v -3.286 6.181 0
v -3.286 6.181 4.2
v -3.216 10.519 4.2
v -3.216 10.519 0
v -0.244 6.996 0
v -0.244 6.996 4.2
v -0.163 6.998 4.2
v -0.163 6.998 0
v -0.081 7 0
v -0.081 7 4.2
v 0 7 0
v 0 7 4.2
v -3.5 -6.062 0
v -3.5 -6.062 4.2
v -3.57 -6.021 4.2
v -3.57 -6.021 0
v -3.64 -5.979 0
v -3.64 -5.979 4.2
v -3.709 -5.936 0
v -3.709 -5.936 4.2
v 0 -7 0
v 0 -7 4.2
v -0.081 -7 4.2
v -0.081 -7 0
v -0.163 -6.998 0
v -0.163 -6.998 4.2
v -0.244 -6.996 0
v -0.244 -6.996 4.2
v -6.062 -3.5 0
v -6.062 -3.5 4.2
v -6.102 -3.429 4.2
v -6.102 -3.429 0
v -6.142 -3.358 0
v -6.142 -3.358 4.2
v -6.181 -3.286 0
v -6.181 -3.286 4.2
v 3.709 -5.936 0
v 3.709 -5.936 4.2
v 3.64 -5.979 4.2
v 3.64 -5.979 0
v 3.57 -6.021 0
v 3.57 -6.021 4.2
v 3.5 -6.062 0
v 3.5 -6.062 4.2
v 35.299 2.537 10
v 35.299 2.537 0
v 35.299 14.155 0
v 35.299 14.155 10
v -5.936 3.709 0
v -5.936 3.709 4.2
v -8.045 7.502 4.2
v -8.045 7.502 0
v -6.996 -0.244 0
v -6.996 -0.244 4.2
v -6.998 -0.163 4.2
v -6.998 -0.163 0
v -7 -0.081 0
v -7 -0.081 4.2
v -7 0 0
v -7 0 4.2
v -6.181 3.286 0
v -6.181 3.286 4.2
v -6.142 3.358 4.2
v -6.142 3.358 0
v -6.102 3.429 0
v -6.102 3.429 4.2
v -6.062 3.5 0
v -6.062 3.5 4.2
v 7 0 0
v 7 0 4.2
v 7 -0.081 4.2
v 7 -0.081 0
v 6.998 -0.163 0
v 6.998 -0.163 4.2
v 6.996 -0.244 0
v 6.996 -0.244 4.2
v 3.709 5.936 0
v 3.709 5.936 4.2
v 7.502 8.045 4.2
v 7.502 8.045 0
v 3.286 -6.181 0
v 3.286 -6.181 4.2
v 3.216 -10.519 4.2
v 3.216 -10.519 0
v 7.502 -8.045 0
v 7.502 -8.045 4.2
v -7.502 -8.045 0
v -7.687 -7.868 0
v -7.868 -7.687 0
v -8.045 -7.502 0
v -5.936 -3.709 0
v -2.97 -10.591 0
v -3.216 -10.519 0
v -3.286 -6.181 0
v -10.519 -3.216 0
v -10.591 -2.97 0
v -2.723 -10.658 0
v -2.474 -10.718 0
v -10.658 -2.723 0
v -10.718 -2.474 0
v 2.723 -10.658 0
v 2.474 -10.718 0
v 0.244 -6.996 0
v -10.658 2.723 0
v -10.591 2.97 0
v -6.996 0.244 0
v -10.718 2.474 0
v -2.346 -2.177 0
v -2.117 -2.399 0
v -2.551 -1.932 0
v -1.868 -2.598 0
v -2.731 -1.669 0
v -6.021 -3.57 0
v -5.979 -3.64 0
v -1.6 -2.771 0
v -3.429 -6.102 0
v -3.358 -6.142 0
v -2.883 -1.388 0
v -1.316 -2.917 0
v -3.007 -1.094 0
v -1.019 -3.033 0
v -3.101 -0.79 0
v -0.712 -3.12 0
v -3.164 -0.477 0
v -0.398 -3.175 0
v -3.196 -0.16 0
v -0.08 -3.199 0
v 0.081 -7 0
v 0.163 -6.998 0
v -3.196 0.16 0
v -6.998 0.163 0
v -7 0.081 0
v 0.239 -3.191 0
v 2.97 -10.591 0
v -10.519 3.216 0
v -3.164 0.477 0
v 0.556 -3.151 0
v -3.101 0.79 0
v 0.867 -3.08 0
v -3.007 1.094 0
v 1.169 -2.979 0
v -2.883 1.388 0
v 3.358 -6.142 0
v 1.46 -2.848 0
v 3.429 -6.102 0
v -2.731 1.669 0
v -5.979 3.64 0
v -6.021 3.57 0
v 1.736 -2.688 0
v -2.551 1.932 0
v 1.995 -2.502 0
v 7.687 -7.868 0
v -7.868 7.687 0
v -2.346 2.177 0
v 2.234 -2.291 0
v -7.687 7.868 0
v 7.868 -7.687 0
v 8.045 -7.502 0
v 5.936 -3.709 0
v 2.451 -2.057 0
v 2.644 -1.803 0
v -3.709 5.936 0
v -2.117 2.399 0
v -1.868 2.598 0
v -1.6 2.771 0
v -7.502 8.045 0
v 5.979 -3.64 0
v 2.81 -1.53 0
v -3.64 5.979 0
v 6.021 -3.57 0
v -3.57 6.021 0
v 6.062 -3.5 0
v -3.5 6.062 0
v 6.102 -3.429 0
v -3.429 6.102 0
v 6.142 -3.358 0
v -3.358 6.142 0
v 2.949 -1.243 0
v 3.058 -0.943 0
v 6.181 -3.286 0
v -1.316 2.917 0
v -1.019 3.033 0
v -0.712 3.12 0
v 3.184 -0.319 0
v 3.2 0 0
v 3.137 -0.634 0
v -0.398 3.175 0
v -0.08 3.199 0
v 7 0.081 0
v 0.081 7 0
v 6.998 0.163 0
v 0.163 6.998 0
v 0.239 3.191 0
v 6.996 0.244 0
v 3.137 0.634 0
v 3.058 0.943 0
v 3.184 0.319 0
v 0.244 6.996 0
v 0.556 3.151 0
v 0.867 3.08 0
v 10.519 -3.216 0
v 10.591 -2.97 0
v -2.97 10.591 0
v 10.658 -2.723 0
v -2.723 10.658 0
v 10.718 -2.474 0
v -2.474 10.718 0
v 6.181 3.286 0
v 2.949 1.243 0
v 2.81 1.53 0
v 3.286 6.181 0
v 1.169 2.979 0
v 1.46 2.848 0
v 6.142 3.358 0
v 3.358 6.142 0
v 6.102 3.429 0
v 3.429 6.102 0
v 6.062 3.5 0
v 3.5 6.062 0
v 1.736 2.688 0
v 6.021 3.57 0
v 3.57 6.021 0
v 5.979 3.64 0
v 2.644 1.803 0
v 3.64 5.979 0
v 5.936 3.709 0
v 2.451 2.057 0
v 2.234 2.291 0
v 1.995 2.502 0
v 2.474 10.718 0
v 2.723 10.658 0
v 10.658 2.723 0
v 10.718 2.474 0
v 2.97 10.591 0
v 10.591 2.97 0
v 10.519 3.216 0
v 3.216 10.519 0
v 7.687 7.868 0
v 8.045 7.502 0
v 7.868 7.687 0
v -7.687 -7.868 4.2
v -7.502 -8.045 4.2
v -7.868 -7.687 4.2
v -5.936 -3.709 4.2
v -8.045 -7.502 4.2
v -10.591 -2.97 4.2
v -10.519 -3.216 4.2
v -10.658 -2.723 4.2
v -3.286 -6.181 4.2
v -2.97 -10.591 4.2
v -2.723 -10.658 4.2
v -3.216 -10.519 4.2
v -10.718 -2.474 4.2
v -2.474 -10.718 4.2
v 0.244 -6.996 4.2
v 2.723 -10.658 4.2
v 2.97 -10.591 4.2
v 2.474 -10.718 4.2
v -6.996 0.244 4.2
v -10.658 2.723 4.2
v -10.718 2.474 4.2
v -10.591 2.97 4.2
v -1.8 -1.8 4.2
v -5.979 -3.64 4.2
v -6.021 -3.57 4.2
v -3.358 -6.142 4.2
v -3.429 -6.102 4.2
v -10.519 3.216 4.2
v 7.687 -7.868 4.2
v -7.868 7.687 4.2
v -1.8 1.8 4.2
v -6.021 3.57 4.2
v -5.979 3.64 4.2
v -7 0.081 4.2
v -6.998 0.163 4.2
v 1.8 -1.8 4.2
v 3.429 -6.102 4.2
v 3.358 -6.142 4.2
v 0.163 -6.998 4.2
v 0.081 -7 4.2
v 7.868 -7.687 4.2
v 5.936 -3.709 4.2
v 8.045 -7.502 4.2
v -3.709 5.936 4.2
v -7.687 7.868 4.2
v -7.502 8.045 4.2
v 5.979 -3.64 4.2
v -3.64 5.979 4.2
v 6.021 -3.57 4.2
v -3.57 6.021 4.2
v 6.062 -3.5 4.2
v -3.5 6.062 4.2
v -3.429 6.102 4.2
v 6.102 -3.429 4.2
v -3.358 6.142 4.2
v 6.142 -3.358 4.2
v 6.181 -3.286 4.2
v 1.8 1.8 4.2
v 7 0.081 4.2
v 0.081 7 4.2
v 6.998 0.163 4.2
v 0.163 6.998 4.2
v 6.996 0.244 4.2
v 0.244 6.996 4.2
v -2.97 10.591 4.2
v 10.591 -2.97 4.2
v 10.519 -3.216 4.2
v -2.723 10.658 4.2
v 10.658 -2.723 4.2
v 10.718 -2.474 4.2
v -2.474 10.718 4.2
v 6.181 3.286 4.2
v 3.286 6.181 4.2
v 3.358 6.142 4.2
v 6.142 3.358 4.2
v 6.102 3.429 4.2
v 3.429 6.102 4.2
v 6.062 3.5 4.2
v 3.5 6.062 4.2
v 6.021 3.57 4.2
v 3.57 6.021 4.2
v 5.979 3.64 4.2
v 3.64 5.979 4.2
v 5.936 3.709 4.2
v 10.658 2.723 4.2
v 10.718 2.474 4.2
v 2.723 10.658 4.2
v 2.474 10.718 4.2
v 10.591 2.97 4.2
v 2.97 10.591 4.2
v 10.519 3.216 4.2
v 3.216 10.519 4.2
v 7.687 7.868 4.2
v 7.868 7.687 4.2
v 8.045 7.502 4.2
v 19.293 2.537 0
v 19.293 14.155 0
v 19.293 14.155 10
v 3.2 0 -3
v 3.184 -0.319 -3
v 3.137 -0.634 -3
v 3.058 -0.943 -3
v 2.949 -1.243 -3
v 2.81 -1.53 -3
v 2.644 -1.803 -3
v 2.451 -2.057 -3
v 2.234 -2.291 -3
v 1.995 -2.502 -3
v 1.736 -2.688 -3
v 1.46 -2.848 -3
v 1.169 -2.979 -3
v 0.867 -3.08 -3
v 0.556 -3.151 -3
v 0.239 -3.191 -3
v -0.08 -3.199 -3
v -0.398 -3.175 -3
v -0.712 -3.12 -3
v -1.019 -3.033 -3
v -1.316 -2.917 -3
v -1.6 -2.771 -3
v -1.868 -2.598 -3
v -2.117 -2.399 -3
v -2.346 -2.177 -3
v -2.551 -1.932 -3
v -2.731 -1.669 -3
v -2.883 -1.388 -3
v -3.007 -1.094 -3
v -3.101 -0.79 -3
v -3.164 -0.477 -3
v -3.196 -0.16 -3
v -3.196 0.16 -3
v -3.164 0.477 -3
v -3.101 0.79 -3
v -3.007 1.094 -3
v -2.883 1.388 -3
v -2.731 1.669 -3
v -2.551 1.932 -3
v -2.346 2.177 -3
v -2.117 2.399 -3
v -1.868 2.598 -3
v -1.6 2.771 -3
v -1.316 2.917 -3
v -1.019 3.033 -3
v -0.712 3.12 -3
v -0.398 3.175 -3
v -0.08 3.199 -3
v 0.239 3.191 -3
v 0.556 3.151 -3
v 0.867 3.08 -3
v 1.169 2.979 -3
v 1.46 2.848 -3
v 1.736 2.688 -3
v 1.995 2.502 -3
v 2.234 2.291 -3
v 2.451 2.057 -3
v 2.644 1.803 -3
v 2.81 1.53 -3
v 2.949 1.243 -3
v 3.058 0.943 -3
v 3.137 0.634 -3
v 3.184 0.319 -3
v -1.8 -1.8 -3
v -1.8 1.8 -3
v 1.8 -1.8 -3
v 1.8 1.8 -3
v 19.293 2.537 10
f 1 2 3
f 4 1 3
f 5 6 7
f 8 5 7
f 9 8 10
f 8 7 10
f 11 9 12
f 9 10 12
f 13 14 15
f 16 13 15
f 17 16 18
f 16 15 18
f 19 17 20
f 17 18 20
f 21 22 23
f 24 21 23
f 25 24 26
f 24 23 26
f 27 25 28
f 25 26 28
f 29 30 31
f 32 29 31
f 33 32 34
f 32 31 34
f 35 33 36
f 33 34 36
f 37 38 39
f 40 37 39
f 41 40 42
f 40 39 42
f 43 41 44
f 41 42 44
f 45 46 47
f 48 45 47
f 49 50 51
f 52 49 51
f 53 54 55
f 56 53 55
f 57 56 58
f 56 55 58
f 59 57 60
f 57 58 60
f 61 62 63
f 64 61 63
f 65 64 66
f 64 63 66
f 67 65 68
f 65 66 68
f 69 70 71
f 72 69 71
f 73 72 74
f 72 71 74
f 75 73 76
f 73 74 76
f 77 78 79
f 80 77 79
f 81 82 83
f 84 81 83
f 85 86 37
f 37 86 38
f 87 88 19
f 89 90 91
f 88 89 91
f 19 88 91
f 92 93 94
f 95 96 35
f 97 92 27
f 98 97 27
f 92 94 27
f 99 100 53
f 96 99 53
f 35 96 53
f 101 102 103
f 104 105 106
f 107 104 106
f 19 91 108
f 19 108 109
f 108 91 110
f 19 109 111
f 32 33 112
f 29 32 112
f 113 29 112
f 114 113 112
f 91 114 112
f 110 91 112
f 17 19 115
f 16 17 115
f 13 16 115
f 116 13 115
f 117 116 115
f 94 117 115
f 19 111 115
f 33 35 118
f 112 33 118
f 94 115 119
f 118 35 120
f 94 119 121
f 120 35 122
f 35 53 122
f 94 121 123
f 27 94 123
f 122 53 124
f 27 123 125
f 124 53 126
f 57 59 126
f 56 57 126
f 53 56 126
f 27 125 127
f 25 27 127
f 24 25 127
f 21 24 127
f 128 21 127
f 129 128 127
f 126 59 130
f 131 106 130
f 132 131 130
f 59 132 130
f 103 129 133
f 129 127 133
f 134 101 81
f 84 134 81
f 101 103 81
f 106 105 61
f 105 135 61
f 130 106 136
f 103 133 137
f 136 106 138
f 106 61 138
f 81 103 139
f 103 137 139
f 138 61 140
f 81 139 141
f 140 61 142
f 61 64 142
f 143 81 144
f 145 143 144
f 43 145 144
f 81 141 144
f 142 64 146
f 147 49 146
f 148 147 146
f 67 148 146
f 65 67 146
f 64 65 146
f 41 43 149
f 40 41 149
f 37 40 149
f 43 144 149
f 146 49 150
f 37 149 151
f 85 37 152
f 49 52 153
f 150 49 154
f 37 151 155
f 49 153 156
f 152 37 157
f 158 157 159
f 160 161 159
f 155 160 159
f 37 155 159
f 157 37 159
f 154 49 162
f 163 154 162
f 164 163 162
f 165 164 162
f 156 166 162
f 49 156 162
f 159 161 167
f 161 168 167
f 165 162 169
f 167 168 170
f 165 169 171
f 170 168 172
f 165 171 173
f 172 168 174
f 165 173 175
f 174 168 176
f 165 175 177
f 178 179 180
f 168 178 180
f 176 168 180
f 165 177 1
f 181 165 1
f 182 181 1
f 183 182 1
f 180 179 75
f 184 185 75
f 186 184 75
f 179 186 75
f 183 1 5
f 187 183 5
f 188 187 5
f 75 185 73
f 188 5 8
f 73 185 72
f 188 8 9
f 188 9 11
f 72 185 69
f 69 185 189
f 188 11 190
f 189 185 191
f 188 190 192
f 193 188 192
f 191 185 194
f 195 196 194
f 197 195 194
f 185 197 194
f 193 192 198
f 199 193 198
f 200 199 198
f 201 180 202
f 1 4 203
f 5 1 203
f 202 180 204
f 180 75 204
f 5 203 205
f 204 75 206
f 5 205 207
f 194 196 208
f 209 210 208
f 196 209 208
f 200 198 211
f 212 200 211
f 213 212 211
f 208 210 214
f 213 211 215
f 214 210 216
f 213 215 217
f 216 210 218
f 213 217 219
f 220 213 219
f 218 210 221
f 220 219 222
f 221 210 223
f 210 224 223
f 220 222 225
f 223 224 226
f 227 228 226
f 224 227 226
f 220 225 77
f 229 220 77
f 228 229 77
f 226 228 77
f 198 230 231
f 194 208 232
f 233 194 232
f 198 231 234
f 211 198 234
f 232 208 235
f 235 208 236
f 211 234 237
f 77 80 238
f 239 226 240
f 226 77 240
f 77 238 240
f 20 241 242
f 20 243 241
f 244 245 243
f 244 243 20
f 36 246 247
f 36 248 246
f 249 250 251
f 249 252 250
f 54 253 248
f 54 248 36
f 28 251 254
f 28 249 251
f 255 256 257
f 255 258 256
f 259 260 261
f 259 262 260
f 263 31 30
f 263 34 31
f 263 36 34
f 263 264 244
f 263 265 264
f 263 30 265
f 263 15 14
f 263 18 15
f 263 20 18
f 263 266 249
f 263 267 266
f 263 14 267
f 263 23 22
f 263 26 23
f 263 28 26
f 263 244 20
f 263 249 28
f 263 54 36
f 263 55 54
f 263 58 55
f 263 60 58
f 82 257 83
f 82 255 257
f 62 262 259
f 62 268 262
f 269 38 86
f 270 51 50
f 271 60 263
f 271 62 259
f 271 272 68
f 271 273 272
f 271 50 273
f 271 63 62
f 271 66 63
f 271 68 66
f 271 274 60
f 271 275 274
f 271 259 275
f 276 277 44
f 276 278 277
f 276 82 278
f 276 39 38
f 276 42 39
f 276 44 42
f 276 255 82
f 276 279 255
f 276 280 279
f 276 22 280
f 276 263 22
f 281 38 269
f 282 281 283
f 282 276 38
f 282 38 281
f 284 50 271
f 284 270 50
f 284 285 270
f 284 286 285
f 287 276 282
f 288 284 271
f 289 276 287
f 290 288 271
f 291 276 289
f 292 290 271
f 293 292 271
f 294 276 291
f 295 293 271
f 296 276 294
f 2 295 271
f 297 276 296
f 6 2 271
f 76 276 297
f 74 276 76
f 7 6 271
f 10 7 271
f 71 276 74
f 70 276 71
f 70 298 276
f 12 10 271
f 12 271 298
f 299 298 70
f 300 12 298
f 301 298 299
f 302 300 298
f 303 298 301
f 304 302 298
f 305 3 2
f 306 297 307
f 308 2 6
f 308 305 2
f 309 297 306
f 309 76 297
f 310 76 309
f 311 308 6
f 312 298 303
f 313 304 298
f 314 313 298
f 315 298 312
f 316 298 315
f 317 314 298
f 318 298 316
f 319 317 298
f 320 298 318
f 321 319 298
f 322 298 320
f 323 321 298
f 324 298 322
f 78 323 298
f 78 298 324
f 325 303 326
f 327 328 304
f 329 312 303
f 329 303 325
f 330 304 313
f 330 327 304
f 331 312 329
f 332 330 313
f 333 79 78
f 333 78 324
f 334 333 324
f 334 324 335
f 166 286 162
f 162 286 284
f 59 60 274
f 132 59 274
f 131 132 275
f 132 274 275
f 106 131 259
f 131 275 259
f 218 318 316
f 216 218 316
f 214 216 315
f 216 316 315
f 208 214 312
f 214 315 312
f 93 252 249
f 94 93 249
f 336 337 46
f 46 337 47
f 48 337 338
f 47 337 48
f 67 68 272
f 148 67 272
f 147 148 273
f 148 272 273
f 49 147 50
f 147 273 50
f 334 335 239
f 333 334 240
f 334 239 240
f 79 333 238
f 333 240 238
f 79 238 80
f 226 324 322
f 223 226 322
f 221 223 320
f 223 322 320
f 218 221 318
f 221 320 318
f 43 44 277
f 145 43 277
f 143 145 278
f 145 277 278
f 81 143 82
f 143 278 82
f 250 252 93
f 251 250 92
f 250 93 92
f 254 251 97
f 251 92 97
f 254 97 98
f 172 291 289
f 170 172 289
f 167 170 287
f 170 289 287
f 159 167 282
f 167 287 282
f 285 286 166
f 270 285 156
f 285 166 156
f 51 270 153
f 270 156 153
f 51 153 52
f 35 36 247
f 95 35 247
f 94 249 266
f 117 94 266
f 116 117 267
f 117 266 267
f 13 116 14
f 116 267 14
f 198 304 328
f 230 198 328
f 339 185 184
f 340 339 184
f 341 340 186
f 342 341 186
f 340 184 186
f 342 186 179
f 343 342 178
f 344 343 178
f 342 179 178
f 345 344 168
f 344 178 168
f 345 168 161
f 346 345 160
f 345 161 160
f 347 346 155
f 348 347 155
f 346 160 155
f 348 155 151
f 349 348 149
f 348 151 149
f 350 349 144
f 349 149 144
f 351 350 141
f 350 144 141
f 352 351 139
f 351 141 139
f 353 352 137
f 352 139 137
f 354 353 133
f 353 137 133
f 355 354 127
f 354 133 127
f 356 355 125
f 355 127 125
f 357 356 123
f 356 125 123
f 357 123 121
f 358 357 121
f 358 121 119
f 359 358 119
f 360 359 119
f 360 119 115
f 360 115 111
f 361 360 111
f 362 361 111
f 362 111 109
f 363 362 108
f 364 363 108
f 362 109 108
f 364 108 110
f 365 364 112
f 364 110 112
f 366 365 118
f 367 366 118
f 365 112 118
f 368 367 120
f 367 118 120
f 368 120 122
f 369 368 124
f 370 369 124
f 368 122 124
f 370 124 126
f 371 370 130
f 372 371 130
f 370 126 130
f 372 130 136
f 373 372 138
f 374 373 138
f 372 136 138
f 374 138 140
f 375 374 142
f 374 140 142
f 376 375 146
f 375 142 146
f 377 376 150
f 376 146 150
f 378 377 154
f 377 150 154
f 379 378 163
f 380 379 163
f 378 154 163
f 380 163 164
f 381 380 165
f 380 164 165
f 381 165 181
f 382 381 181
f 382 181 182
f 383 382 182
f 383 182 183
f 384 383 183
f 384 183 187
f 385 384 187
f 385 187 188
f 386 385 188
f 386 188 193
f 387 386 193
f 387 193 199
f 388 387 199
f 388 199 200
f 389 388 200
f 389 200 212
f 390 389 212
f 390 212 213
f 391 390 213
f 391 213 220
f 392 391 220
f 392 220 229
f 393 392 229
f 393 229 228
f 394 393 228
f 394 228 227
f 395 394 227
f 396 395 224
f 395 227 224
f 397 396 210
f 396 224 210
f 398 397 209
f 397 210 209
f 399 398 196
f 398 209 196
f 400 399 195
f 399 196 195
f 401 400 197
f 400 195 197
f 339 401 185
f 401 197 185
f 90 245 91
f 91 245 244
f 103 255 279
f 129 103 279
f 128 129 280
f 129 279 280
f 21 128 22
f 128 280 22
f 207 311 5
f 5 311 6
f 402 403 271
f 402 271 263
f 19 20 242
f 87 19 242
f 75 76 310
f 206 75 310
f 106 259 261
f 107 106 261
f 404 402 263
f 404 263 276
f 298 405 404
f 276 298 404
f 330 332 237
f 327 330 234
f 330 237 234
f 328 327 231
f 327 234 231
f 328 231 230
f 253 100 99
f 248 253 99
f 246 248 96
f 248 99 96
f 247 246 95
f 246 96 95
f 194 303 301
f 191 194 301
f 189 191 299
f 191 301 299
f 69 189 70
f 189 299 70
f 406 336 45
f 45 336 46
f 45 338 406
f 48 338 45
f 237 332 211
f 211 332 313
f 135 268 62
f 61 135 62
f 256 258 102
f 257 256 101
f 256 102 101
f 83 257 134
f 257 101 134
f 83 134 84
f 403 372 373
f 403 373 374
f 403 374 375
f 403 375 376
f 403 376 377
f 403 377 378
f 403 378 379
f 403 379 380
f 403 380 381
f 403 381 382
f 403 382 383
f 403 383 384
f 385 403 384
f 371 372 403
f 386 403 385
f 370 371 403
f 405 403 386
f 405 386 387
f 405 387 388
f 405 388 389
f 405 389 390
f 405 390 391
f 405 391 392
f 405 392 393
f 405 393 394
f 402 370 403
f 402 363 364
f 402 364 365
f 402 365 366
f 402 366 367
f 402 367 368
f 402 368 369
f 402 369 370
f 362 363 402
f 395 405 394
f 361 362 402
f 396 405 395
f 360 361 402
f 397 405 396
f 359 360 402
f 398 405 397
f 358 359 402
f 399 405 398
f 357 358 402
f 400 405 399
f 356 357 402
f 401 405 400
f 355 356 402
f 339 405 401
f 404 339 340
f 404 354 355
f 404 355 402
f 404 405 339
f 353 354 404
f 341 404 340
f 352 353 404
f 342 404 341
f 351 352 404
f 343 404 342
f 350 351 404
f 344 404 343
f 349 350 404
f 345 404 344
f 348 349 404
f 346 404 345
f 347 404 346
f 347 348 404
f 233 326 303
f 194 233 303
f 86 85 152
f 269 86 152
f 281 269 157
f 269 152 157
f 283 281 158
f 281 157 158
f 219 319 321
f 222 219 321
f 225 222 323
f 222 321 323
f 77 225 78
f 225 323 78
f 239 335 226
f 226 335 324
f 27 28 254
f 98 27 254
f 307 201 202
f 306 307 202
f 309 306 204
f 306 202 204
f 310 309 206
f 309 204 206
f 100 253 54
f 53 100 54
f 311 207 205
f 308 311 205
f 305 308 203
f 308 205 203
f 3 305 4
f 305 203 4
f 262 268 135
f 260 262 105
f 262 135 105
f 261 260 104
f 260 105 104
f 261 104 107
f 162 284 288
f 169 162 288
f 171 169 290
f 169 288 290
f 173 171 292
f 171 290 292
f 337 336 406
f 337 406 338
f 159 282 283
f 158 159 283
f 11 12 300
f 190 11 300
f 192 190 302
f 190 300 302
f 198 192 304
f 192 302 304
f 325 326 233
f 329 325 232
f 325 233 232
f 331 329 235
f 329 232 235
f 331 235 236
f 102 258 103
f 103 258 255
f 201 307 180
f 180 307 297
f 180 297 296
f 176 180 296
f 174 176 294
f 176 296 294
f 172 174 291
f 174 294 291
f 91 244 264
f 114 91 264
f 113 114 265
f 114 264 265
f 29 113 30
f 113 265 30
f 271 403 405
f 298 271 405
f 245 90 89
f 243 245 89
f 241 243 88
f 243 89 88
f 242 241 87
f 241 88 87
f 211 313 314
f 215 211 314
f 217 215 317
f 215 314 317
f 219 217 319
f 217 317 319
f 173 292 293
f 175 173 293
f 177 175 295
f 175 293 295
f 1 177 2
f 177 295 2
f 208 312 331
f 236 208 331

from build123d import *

# Parameters (mm, degrees)
F0_R            = 11
F1_DEPTH        = 4.2
F3_DEPTH        = 4.201
F3_COPIES_COUNT = 12
F5_R            = 3.2
F6_DEPTH        = 3
F7_W            = 3.6
F7_H            = 3.6
F8_DEPTH        = 7.201
F9_W            = 16.0063430667
F9_H            = 11.617815122
F10_DEPTH       = 10


# Not quite as in the source:
# - a pattern or mirror of a feature is missing from the dataset's text; its kind, count and spacing are read off the source's solid


with BuildPart() as f1:
    # F0 (on Top) → F1 (new body)
    with BuildSketch(Plane.XY):
        Circle(F0_R)
    extrude(amount=F1_DEPTH)

    # F2 (on face) → F3 (cut, through all)
    with BuildSketch(Plane.XY.offset(4.2)):
        with BuildLine():
            ThreePointArc((0.2442964769, -6.9957357891), (0.1221668451, -6.9989338661), (0, -7))
            Line((0, -7), (0, -11))
            ThreePointArc((0, -11), (1.2452353514, -10.9292904124), (2.4744615978, -10.7180707126))
            Line((2.4744615978, -10.7180707126), (0.2442964769, -6.9957357891))
        make_face()
        with BuildLine():
            Line((0, -11), (0, -7))
            ThreePointArc((0, -7), (-0.1221668451, -6.9989338661), (-0.2442964769, -6.9957357891))
            Line((-0.2442964769, -6.9957357891), (-2.4744615978, -10.7180707126))
            ThreePointArc((-2.4744615978, -10.7180707126), (-1.2452353514, -10.9292904124), (0, -11))
        make_face()
    f3 = extrude(amount=-F3_DEPTH, mode=Mode.SUBTRACT)

    # F3_copies: F3 ×12 about axis
    f3_copies_axis = Axis((0, 0, 0), (0, 0, 1))
    for i in range(1, F3_COPIES_COUNT):
        add(f3.rotate(f3_copies_axis, i * 360 / F3_COPIES_COUNT), mode=Mode.SUBTRACT)

    # F5 (on face) → F6 (join)
    with BuildSketch(Plane(origin=(0, 0, 0), x_dir=(1, 0, 0), z_dir=(0, 0, -1))):
        Circle(F5_R)
    extrude(amount=F6_DEPTH)

    # F7 (on face) → F8 (cut, through all)
    with BuildSketch(Plane(origin=(0, 0, -3), x_dir=(1, 0, 0), z_dir=(0, 0, -1))):
        Rectangle(F7_W, F7_H)
    extrude(amount=-F8_DEPTH, mode=Mode.SUBTRACT)


with BuildPart() as f10:
    # F9 (on Top) → F10 (new body)
    with BuildSketch(Plane.XY):
        with Locations((27.296114713, 8.3463508636)):
            Rectangle(F9_W, F9_H)
    extrude(amount=F10_DEPTH)


solid = Compound([f1.part, f10.part])
